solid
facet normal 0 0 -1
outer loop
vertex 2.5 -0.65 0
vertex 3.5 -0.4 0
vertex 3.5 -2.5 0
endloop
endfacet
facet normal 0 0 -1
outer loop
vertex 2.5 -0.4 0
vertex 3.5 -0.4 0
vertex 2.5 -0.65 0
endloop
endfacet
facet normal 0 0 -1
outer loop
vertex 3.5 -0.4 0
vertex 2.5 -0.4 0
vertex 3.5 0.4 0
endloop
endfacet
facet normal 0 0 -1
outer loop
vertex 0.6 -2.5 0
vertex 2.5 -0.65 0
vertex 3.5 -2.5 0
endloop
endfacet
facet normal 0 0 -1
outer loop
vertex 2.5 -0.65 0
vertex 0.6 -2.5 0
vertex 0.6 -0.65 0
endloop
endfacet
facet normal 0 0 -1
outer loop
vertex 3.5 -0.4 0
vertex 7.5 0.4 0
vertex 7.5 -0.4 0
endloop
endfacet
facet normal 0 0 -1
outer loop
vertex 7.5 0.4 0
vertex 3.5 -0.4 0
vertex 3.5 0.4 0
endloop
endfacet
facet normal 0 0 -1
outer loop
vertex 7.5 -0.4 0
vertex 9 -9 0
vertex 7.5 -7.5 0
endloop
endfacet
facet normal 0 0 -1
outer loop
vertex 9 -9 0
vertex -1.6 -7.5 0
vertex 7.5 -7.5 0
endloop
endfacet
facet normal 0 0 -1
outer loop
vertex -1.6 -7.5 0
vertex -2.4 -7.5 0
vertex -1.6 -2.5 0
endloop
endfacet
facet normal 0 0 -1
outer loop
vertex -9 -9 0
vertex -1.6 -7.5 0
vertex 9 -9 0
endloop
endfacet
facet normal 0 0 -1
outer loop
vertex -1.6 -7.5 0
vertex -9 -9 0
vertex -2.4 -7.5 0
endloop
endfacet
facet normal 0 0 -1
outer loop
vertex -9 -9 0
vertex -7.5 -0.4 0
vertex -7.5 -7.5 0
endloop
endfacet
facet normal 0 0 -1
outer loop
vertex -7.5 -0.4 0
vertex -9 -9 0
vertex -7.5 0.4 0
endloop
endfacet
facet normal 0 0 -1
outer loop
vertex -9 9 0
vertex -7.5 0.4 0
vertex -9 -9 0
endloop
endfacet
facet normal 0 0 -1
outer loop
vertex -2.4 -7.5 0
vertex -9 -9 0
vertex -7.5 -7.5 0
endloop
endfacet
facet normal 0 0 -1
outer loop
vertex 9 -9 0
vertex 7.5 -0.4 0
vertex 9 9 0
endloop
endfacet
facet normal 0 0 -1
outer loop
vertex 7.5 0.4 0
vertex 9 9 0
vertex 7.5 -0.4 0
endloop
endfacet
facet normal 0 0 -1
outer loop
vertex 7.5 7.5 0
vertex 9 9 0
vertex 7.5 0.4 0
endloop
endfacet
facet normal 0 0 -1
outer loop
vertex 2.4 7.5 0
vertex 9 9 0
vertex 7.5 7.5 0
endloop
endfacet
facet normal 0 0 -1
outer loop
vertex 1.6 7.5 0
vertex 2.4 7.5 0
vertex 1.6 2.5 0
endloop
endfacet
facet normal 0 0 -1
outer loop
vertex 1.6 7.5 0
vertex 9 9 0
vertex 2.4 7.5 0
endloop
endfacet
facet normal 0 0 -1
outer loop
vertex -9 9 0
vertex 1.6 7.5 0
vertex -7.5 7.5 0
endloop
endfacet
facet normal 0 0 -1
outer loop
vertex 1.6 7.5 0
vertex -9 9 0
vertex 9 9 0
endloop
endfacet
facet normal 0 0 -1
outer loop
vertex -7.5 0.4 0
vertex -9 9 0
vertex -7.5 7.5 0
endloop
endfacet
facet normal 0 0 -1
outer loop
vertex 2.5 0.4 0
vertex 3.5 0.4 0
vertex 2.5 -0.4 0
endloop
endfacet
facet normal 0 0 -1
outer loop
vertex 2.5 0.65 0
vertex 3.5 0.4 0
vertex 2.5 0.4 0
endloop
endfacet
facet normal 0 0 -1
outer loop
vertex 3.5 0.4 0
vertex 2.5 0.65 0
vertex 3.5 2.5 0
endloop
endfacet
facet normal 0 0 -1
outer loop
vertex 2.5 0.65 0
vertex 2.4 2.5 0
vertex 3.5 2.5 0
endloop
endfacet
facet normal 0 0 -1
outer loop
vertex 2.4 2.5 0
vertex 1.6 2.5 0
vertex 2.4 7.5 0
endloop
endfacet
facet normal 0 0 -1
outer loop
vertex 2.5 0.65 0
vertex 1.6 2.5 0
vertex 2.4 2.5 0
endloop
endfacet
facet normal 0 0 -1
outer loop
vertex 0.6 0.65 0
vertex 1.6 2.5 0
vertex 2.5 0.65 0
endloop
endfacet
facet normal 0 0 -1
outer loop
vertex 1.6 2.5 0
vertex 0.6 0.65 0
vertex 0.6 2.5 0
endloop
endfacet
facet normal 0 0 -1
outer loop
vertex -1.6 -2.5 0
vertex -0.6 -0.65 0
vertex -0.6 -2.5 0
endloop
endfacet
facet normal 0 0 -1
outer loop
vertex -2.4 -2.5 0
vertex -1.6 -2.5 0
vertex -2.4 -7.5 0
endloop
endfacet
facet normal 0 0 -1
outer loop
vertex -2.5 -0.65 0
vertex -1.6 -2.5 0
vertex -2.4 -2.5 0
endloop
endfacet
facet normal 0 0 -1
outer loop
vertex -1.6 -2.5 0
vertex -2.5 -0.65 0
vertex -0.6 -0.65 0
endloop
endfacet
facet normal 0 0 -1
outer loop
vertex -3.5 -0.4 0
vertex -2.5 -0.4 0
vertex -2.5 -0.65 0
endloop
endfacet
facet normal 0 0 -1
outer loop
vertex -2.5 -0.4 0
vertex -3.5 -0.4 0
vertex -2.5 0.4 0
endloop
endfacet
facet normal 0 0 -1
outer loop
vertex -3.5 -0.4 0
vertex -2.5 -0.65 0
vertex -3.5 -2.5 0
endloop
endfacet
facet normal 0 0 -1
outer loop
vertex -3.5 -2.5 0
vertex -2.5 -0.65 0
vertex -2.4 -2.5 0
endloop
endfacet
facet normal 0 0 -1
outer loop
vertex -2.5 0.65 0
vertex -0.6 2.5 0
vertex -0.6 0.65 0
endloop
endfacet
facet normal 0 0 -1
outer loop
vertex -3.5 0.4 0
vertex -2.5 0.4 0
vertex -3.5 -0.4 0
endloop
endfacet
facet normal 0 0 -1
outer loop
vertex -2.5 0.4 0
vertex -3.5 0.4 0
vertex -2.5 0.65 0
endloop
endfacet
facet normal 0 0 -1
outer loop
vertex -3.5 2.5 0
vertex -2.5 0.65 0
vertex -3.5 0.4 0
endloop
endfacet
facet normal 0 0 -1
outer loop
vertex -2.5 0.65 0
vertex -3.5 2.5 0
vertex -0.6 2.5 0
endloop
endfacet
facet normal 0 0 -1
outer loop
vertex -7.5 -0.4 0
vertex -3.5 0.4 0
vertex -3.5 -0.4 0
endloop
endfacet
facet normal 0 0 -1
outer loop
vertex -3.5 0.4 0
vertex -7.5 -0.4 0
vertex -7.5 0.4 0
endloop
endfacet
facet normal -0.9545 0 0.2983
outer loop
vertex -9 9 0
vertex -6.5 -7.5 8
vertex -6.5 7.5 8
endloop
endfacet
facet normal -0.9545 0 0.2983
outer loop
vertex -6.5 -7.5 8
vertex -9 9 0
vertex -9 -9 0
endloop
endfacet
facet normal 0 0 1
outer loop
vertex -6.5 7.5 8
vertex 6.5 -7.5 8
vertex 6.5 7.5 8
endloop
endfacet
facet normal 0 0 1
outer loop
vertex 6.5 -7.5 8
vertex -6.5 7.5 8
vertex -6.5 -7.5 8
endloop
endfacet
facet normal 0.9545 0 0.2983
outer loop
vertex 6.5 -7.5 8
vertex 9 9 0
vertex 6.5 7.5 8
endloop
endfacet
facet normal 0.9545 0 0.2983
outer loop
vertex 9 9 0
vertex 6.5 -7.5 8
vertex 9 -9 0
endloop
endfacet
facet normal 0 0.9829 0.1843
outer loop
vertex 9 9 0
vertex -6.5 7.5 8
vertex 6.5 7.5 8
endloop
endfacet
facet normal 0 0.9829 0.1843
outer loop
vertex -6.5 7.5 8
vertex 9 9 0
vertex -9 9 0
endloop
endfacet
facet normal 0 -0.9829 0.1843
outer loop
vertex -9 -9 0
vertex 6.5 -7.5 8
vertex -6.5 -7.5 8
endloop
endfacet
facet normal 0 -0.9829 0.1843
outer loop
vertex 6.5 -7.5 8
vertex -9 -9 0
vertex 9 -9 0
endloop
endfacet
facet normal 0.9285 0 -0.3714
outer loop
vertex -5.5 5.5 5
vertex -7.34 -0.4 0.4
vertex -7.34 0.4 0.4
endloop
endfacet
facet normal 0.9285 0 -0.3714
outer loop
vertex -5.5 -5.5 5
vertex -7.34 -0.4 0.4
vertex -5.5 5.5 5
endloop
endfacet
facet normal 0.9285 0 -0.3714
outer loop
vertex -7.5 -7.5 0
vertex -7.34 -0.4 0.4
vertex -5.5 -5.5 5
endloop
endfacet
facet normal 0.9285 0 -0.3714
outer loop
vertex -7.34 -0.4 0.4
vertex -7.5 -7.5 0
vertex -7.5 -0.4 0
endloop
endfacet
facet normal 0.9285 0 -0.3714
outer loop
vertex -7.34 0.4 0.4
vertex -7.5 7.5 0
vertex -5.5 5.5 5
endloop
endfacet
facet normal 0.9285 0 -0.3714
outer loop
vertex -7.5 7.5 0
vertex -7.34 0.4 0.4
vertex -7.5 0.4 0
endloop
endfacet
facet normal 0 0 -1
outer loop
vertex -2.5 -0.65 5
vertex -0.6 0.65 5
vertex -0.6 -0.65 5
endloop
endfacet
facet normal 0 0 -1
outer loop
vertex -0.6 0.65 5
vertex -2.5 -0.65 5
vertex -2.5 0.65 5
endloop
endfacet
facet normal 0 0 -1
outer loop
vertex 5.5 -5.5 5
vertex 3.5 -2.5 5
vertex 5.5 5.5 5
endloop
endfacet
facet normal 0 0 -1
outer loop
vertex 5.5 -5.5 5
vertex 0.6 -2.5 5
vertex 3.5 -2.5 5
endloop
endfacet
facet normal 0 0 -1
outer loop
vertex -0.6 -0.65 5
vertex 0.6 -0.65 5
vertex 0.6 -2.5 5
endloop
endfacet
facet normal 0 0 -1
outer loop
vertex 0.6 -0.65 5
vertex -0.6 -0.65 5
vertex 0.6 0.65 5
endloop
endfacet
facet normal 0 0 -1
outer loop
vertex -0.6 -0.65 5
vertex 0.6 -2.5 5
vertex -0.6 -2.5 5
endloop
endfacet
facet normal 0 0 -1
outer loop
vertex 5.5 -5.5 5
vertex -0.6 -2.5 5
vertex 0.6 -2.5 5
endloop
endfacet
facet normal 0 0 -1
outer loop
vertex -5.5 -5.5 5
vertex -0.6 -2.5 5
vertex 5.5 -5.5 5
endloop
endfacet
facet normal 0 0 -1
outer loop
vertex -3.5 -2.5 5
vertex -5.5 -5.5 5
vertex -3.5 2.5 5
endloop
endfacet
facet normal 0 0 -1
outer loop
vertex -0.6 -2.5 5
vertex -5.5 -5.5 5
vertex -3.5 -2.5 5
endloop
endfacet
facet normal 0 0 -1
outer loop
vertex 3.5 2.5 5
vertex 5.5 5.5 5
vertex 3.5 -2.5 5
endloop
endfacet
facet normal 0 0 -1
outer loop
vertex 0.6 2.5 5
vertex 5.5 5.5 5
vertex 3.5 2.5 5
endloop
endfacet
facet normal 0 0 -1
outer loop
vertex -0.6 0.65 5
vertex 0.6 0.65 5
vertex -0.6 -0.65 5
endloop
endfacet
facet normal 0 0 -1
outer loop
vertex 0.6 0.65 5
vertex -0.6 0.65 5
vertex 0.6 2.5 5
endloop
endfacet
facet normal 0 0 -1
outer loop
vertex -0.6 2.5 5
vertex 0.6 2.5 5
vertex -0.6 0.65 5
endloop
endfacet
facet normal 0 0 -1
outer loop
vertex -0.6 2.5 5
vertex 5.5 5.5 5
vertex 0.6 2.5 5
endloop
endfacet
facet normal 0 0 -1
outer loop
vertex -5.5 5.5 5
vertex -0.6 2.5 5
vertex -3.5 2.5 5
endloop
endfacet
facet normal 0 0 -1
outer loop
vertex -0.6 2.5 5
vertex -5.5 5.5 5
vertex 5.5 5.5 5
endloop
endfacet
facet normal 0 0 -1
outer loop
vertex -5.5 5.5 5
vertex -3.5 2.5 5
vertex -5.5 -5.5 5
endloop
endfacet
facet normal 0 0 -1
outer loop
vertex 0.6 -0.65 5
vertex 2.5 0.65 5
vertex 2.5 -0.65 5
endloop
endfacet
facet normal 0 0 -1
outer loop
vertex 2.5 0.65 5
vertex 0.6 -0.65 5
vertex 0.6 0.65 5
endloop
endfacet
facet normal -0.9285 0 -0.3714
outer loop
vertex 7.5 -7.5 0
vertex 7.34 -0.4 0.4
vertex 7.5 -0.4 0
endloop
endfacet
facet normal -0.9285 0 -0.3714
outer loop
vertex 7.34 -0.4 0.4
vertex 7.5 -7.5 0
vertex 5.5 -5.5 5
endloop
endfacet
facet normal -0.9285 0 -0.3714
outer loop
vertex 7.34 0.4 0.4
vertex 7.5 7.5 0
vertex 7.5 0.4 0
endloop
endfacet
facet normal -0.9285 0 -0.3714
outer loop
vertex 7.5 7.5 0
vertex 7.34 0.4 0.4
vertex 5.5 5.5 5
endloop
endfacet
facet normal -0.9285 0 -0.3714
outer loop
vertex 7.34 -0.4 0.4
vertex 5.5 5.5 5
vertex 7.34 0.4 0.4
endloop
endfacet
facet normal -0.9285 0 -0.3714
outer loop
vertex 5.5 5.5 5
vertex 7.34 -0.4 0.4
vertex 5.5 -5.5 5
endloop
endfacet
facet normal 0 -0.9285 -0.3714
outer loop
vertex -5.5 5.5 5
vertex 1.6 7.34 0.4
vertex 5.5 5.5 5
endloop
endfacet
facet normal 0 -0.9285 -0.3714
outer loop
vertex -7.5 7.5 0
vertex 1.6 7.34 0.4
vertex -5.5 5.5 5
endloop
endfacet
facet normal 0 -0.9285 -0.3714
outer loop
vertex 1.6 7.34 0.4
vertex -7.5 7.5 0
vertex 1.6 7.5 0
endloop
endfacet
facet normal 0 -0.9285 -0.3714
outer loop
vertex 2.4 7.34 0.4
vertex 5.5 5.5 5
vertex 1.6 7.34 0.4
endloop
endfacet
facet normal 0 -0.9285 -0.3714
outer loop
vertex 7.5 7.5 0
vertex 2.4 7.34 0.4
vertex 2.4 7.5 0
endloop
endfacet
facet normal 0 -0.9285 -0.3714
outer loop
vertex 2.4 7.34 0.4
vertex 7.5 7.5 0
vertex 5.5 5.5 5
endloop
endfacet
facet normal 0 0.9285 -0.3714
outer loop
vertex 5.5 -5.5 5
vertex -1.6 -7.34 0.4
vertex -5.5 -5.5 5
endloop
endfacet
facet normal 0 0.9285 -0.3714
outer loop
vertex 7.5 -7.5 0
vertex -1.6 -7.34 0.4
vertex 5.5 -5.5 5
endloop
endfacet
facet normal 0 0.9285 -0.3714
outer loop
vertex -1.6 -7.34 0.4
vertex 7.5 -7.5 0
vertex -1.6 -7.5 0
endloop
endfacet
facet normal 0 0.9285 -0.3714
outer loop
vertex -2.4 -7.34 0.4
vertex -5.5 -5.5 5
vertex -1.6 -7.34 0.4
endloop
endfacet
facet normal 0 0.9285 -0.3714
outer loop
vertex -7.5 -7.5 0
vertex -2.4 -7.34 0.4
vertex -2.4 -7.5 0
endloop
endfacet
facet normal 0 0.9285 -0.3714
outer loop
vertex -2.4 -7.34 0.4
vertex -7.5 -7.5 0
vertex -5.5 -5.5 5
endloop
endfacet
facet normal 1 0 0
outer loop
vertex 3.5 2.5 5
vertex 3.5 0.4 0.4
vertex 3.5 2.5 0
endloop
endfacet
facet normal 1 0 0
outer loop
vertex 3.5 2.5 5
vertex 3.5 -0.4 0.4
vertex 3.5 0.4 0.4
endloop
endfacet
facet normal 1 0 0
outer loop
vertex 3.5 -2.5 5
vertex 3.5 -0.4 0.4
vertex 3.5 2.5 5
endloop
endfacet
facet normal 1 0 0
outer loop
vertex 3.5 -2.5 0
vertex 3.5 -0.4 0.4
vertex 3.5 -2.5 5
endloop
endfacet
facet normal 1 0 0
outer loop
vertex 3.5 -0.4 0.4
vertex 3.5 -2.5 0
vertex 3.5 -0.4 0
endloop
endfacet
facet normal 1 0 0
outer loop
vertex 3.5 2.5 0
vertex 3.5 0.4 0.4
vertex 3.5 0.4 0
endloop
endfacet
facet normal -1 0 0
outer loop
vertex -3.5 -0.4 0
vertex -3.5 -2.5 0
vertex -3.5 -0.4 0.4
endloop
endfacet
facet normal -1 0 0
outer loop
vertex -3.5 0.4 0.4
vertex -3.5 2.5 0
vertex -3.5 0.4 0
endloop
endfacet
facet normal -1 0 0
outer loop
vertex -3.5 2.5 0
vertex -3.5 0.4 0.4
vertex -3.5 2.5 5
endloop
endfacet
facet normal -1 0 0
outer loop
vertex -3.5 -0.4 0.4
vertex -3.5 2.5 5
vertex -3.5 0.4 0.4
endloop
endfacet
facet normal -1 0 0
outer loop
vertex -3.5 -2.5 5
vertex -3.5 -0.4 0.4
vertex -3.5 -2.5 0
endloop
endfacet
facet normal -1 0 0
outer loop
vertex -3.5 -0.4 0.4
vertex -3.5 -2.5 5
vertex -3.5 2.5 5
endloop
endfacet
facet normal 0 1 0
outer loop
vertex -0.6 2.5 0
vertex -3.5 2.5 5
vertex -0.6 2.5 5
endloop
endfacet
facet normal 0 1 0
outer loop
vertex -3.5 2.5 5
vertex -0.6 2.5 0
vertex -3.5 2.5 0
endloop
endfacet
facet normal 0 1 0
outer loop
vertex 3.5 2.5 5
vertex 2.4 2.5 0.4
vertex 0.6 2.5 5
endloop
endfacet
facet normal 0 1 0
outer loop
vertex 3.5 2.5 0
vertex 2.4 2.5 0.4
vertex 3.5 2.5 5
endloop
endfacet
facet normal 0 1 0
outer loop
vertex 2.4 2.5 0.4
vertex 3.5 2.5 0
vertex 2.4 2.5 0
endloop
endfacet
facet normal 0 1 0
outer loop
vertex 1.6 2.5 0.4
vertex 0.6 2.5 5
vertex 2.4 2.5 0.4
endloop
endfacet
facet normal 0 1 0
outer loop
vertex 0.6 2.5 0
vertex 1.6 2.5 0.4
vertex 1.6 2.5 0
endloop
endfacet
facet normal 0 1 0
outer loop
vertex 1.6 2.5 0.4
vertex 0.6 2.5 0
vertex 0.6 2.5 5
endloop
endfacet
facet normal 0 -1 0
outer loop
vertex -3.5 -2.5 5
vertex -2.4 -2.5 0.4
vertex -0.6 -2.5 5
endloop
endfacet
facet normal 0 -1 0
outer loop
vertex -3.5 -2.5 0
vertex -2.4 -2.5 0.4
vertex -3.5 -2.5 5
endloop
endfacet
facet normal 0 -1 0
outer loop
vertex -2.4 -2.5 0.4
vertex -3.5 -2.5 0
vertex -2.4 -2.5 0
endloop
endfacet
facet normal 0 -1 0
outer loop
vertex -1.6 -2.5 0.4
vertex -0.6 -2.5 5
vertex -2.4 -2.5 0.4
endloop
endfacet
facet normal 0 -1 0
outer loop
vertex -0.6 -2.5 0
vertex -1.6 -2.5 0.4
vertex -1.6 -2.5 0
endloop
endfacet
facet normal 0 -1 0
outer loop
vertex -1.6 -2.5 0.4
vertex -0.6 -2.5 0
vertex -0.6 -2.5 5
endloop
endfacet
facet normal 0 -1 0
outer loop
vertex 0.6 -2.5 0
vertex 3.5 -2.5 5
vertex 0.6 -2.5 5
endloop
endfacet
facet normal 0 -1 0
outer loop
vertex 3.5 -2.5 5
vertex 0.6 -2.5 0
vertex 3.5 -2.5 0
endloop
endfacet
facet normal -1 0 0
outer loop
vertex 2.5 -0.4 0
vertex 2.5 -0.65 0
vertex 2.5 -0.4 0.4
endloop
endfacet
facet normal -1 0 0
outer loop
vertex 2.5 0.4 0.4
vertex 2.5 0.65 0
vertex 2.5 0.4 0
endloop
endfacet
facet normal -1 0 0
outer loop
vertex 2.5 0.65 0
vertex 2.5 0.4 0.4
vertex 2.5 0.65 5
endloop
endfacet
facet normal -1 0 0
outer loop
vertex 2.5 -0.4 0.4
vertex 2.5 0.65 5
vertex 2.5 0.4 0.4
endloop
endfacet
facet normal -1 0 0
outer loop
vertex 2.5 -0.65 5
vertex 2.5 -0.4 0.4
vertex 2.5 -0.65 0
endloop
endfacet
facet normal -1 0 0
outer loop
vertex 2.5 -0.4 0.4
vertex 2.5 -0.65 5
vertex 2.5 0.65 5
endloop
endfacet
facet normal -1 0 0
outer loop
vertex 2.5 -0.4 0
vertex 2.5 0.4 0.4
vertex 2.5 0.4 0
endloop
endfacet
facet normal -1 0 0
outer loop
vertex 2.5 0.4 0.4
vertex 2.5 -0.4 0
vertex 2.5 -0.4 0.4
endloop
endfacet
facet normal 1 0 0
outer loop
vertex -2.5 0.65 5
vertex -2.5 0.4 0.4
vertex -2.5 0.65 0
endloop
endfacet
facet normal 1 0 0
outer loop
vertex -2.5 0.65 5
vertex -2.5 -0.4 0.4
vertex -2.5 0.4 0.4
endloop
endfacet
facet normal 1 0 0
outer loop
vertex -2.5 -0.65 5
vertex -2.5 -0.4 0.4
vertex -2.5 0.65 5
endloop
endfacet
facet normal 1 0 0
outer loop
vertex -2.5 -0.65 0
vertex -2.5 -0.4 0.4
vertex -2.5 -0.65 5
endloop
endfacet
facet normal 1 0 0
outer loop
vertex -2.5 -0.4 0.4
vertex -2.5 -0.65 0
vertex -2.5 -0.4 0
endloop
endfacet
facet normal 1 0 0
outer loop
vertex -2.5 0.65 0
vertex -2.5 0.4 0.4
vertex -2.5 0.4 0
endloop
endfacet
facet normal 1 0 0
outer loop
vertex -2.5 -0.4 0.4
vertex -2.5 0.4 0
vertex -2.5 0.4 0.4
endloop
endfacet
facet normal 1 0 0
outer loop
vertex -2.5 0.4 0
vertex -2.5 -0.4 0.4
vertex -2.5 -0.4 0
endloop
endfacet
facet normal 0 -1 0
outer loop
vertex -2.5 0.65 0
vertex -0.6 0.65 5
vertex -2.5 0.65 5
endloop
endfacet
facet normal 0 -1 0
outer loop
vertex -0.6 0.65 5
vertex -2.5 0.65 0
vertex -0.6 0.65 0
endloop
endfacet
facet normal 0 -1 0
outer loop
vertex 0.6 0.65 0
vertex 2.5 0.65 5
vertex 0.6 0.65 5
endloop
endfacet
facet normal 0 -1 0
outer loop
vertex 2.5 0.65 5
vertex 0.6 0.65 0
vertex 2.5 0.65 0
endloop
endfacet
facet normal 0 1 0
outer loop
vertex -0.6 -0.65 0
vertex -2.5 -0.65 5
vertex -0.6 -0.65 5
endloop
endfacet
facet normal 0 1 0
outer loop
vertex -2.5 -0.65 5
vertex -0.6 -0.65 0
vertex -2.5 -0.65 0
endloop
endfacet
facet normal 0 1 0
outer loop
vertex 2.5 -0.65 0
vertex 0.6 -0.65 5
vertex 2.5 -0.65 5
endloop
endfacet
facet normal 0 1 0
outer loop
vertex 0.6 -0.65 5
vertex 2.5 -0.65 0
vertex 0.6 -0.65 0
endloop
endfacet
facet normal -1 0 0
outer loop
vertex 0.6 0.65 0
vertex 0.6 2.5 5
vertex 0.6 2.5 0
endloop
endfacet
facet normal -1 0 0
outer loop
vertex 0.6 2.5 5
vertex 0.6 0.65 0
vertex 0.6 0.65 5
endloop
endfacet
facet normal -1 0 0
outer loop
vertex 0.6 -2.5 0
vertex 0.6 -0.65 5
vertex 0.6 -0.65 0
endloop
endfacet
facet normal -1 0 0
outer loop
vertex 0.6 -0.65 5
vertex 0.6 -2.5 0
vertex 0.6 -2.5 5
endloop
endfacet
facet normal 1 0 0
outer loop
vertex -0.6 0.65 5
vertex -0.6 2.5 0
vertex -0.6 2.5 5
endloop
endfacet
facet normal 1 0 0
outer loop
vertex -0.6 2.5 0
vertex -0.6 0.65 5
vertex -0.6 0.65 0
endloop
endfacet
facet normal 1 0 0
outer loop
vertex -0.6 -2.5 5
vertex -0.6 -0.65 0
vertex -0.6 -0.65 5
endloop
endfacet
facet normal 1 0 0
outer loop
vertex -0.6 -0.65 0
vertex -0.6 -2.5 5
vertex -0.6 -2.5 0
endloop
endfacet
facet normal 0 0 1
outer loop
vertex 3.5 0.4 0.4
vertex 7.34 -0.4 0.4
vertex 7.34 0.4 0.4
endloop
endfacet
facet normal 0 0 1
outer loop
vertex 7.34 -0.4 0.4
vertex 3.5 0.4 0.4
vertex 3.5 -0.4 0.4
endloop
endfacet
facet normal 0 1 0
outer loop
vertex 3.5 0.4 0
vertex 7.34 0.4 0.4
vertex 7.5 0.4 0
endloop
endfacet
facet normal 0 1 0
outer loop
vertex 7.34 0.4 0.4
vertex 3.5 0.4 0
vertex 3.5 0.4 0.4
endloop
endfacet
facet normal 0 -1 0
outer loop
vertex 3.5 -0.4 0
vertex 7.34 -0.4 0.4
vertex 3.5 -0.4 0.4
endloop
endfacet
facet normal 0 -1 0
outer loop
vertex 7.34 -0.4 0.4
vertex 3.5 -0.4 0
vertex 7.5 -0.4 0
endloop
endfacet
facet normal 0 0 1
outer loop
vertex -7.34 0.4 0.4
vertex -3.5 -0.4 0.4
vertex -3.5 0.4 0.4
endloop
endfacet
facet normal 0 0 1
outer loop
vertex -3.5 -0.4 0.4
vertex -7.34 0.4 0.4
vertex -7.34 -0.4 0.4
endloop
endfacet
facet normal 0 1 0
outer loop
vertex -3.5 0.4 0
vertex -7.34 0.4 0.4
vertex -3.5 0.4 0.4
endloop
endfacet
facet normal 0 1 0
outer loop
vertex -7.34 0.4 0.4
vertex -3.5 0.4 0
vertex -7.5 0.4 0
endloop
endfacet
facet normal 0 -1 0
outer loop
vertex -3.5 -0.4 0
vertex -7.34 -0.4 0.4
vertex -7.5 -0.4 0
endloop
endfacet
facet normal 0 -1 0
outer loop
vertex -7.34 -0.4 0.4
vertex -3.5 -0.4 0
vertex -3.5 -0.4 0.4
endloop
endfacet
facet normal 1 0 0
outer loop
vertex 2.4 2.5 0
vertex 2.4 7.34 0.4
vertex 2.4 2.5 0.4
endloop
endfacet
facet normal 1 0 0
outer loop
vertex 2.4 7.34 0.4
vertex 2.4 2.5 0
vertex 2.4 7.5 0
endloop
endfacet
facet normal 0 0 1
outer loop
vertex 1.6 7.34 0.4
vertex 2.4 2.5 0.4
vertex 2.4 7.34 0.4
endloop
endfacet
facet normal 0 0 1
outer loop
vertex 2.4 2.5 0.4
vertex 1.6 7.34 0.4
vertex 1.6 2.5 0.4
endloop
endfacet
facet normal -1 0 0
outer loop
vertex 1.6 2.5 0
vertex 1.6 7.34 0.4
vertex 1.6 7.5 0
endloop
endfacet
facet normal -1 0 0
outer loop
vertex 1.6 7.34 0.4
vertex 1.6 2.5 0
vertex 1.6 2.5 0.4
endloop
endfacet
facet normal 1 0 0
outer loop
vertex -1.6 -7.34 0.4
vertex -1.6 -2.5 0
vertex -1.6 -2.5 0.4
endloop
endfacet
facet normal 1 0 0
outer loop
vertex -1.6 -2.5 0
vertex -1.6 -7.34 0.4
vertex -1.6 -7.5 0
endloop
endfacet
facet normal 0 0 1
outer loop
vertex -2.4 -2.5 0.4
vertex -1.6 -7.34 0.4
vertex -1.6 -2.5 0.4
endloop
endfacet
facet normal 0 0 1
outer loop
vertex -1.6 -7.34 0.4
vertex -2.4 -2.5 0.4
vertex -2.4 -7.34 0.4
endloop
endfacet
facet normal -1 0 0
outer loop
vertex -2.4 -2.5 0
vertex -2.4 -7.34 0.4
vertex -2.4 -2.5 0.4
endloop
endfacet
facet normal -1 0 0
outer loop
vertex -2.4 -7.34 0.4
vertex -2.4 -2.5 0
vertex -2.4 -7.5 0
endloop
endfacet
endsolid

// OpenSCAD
key_height = 8;
bottom_size = 18;
top_x_size = 13;
top_y_size = 15;

union() {
  difference() {
    linear_extrude(height = key_height, scale = [top_x_size / bottom_size, top_y_size / bottom_size]) {
      square(size=bottom_size, center=true);
    }
    linear_extrude(height = 5, scale = [11/(bottom_size-3), 11/(bottom_size-3)]) {
      square(size=bottom_size-3, center=true);
    }
  }
  translate([0, 0, 3]) {
    difference() {
      cube([7, 5, 6], center=true);
      cube([5, 1.3, 12], center=true);
      cube([1.2, 6, 12], center=true);
    }
  }
  translate([(18-7)/2, 0, 0.2]) cube([(18-6)/2, 0.8, 0.4], center=true);
  translate([-(18-7)/2, 0, 0.2]) cube([(18-6)/2, 0.8, 0.4], center=true);
  translate([2, (18-7)/2, 0.2]) cube([0.8, (18-5)/2, 0.4], center=true);
  translate([-2, -(18-7)/2, 0.2]) cube([0.8, (18-5)/2, 0.4], center=true);
}
